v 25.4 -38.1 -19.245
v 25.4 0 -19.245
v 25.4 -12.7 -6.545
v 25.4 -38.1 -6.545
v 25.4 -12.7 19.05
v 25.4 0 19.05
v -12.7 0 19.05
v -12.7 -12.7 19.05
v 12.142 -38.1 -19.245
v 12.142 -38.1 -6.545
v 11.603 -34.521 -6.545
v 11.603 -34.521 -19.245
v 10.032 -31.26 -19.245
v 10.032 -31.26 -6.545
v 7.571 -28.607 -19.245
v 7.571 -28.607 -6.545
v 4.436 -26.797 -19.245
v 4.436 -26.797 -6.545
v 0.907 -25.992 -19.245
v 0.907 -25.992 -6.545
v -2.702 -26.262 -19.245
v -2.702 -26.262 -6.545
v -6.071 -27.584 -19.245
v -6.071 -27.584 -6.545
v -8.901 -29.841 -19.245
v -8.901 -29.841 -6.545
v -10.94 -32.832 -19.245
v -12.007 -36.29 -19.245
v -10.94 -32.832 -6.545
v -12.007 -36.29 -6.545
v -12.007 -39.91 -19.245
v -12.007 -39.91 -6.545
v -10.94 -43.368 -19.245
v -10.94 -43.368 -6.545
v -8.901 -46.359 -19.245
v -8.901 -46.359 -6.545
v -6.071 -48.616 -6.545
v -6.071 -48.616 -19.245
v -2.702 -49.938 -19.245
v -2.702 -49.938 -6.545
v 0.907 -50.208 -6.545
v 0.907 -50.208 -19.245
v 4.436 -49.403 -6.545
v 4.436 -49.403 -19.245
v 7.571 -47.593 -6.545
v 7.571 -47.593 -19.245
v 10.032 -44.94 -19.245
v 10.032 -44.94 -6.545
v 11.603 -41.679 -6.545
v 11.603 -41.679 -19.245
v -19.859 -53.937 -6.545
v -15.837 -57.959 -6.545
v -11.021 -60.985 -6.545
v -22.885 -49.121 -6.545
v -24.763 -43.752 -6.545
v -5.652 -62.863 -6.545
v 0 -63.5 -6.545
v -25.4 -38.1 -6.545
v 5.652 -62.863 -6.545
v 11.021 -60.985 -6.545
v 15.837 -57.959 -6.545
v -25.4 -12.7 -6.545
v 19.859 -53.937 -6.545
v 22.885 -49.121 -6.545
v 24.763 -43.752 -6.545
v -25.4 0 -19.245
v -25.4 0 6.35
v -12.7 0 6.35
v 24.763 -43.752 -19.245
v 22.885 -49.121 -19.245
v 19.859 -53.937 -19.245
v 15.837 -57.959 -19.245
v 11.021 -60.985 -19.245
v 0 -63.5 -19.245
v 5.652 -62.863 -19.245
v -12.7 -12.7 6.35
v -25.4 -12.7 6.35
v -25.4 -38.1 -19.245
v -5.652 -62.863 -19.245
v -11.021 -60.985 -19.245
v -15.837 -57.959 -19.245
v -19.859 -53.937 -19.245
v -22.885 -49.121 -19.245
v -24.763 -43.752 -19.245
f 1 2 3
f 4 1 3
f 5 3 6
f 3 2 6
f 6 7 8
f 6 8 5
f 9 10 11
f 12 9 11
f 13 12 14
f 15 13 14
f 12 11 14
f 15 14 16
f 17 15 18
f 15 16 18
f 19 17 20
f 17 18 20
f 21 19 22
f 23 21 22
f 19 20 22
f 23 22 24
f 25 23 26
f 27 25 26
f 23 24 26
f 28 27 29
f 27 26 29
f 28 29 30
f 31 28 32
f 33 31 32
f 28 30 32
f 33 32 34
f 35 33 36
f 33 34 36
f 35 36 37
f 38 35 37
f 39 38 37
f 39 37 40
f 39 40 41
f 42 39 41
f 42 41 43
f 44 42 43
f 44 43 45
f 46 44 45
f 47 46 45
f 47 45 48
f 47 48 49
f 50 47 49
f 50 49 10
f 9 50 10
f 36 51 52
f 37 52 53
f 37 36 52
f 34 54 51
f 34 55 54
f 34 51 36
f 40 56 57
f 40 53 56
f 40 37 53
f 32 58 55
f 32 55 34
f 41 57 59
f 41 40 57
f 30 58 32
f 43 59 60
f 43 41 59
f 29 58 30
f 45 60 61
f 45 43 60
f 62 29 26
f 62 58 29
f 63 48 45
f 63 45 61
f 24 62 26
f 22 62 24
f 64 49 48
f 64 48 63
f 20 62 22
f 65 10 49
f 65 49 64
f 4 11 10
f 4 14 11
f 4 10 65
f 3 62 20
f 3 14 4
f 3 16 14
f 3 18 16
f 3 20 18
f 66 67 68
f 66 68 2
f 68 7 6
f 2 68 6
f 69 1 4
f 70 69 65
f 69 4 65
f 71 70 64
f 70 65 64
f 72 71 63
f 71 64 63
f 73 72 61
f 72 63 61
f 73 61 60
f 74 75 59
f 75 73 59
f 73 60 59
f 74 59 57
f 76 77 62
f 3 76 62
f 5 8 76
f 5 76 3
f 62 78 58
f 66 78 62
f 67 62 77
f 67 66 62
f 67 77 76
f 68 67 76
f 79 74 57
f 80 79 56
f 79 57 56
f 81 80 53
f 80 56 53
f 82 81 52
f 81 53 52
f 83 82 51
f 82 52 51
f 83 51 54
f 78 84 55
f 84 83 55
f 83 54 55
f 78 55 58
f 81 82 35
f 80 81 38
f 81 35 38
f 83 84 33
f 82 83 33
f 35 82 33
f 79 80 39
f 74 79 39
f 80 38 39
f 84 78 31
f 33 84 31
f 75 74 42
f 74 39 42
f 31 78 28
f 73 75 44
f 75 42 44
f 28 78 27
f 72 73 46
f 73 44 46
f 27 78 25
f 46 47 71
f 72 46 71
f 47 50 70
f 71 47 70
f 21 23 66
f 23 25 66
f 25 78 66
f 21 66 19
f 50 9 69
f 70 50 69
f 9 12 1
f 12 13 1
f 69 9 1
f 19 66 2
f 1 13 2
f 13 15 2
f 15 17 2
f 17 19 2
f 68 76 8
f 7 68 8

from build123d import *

# Parameters (mm, degrees)
F0_W     = 50.8
F0_H     = 38.1
F1_DEPTH = 12.7
F2_W     = 12.7
F2_H     = 12.7
F3_DEPTH = 12.7
F4_W     = 50.8
F4_H     = 12.7
F5_DEPTH = 63.5
F6_R     = 12.14233
F7_DEPTH = 12.701


with BuildPart() as f1:
    # F0 (on Front) → F1 (new body)
    with BuildSketch(Plane.XZ):
        Rectangle(F0_W, F0_H)
    extrude(amount=F1_DEPTH)

    # F2 (on Front) → F3 (cut)
    with BuildSketch(Plane.XZ):
        with Locations((-19.05, 12.7)):
            Rectangle(F2_W, F2_H)
    extrude(amount=F3_DEPTH, mode=Mode.SUBTRACT)

    # F4 (on Front) → F5 (join)
    with BuildSketch(Plane.XZ):
        with Locations((0, -12.89534)):
            Rectangle(F4_W, F4_H)
    extrude(amount=F5_DEPTH)

    # F6 (on face) → F7 (cut, through all)
    with BuildSketch(Plane.XY.offset(-6.54534)):
        with BuildLine():
            Line((-25.4, -63.5), (0, -63.5))
            ThreePointArc((0, -63.5), (-17.960512, -56.060512), (-25.4, -38.1))
            Line((-25.4, -38.1), (-25.4, -63.5))
        make_face()
        with BuildLine():
            Line((25.4, -63.5), (25.4, -38.1))
            ThreePointArc((25.4, -38.1), (17.960512, -56.060512), (0, -63.5))
            Line((0, -63.5), (25.4, -63.5))
        make_face()
        with Locations((0, -38.1)):
            Circle(F6_R)
    extrude(amount=-F7_DEPTH, mode=Mode.SUBTRACT)


solid = f1.part
